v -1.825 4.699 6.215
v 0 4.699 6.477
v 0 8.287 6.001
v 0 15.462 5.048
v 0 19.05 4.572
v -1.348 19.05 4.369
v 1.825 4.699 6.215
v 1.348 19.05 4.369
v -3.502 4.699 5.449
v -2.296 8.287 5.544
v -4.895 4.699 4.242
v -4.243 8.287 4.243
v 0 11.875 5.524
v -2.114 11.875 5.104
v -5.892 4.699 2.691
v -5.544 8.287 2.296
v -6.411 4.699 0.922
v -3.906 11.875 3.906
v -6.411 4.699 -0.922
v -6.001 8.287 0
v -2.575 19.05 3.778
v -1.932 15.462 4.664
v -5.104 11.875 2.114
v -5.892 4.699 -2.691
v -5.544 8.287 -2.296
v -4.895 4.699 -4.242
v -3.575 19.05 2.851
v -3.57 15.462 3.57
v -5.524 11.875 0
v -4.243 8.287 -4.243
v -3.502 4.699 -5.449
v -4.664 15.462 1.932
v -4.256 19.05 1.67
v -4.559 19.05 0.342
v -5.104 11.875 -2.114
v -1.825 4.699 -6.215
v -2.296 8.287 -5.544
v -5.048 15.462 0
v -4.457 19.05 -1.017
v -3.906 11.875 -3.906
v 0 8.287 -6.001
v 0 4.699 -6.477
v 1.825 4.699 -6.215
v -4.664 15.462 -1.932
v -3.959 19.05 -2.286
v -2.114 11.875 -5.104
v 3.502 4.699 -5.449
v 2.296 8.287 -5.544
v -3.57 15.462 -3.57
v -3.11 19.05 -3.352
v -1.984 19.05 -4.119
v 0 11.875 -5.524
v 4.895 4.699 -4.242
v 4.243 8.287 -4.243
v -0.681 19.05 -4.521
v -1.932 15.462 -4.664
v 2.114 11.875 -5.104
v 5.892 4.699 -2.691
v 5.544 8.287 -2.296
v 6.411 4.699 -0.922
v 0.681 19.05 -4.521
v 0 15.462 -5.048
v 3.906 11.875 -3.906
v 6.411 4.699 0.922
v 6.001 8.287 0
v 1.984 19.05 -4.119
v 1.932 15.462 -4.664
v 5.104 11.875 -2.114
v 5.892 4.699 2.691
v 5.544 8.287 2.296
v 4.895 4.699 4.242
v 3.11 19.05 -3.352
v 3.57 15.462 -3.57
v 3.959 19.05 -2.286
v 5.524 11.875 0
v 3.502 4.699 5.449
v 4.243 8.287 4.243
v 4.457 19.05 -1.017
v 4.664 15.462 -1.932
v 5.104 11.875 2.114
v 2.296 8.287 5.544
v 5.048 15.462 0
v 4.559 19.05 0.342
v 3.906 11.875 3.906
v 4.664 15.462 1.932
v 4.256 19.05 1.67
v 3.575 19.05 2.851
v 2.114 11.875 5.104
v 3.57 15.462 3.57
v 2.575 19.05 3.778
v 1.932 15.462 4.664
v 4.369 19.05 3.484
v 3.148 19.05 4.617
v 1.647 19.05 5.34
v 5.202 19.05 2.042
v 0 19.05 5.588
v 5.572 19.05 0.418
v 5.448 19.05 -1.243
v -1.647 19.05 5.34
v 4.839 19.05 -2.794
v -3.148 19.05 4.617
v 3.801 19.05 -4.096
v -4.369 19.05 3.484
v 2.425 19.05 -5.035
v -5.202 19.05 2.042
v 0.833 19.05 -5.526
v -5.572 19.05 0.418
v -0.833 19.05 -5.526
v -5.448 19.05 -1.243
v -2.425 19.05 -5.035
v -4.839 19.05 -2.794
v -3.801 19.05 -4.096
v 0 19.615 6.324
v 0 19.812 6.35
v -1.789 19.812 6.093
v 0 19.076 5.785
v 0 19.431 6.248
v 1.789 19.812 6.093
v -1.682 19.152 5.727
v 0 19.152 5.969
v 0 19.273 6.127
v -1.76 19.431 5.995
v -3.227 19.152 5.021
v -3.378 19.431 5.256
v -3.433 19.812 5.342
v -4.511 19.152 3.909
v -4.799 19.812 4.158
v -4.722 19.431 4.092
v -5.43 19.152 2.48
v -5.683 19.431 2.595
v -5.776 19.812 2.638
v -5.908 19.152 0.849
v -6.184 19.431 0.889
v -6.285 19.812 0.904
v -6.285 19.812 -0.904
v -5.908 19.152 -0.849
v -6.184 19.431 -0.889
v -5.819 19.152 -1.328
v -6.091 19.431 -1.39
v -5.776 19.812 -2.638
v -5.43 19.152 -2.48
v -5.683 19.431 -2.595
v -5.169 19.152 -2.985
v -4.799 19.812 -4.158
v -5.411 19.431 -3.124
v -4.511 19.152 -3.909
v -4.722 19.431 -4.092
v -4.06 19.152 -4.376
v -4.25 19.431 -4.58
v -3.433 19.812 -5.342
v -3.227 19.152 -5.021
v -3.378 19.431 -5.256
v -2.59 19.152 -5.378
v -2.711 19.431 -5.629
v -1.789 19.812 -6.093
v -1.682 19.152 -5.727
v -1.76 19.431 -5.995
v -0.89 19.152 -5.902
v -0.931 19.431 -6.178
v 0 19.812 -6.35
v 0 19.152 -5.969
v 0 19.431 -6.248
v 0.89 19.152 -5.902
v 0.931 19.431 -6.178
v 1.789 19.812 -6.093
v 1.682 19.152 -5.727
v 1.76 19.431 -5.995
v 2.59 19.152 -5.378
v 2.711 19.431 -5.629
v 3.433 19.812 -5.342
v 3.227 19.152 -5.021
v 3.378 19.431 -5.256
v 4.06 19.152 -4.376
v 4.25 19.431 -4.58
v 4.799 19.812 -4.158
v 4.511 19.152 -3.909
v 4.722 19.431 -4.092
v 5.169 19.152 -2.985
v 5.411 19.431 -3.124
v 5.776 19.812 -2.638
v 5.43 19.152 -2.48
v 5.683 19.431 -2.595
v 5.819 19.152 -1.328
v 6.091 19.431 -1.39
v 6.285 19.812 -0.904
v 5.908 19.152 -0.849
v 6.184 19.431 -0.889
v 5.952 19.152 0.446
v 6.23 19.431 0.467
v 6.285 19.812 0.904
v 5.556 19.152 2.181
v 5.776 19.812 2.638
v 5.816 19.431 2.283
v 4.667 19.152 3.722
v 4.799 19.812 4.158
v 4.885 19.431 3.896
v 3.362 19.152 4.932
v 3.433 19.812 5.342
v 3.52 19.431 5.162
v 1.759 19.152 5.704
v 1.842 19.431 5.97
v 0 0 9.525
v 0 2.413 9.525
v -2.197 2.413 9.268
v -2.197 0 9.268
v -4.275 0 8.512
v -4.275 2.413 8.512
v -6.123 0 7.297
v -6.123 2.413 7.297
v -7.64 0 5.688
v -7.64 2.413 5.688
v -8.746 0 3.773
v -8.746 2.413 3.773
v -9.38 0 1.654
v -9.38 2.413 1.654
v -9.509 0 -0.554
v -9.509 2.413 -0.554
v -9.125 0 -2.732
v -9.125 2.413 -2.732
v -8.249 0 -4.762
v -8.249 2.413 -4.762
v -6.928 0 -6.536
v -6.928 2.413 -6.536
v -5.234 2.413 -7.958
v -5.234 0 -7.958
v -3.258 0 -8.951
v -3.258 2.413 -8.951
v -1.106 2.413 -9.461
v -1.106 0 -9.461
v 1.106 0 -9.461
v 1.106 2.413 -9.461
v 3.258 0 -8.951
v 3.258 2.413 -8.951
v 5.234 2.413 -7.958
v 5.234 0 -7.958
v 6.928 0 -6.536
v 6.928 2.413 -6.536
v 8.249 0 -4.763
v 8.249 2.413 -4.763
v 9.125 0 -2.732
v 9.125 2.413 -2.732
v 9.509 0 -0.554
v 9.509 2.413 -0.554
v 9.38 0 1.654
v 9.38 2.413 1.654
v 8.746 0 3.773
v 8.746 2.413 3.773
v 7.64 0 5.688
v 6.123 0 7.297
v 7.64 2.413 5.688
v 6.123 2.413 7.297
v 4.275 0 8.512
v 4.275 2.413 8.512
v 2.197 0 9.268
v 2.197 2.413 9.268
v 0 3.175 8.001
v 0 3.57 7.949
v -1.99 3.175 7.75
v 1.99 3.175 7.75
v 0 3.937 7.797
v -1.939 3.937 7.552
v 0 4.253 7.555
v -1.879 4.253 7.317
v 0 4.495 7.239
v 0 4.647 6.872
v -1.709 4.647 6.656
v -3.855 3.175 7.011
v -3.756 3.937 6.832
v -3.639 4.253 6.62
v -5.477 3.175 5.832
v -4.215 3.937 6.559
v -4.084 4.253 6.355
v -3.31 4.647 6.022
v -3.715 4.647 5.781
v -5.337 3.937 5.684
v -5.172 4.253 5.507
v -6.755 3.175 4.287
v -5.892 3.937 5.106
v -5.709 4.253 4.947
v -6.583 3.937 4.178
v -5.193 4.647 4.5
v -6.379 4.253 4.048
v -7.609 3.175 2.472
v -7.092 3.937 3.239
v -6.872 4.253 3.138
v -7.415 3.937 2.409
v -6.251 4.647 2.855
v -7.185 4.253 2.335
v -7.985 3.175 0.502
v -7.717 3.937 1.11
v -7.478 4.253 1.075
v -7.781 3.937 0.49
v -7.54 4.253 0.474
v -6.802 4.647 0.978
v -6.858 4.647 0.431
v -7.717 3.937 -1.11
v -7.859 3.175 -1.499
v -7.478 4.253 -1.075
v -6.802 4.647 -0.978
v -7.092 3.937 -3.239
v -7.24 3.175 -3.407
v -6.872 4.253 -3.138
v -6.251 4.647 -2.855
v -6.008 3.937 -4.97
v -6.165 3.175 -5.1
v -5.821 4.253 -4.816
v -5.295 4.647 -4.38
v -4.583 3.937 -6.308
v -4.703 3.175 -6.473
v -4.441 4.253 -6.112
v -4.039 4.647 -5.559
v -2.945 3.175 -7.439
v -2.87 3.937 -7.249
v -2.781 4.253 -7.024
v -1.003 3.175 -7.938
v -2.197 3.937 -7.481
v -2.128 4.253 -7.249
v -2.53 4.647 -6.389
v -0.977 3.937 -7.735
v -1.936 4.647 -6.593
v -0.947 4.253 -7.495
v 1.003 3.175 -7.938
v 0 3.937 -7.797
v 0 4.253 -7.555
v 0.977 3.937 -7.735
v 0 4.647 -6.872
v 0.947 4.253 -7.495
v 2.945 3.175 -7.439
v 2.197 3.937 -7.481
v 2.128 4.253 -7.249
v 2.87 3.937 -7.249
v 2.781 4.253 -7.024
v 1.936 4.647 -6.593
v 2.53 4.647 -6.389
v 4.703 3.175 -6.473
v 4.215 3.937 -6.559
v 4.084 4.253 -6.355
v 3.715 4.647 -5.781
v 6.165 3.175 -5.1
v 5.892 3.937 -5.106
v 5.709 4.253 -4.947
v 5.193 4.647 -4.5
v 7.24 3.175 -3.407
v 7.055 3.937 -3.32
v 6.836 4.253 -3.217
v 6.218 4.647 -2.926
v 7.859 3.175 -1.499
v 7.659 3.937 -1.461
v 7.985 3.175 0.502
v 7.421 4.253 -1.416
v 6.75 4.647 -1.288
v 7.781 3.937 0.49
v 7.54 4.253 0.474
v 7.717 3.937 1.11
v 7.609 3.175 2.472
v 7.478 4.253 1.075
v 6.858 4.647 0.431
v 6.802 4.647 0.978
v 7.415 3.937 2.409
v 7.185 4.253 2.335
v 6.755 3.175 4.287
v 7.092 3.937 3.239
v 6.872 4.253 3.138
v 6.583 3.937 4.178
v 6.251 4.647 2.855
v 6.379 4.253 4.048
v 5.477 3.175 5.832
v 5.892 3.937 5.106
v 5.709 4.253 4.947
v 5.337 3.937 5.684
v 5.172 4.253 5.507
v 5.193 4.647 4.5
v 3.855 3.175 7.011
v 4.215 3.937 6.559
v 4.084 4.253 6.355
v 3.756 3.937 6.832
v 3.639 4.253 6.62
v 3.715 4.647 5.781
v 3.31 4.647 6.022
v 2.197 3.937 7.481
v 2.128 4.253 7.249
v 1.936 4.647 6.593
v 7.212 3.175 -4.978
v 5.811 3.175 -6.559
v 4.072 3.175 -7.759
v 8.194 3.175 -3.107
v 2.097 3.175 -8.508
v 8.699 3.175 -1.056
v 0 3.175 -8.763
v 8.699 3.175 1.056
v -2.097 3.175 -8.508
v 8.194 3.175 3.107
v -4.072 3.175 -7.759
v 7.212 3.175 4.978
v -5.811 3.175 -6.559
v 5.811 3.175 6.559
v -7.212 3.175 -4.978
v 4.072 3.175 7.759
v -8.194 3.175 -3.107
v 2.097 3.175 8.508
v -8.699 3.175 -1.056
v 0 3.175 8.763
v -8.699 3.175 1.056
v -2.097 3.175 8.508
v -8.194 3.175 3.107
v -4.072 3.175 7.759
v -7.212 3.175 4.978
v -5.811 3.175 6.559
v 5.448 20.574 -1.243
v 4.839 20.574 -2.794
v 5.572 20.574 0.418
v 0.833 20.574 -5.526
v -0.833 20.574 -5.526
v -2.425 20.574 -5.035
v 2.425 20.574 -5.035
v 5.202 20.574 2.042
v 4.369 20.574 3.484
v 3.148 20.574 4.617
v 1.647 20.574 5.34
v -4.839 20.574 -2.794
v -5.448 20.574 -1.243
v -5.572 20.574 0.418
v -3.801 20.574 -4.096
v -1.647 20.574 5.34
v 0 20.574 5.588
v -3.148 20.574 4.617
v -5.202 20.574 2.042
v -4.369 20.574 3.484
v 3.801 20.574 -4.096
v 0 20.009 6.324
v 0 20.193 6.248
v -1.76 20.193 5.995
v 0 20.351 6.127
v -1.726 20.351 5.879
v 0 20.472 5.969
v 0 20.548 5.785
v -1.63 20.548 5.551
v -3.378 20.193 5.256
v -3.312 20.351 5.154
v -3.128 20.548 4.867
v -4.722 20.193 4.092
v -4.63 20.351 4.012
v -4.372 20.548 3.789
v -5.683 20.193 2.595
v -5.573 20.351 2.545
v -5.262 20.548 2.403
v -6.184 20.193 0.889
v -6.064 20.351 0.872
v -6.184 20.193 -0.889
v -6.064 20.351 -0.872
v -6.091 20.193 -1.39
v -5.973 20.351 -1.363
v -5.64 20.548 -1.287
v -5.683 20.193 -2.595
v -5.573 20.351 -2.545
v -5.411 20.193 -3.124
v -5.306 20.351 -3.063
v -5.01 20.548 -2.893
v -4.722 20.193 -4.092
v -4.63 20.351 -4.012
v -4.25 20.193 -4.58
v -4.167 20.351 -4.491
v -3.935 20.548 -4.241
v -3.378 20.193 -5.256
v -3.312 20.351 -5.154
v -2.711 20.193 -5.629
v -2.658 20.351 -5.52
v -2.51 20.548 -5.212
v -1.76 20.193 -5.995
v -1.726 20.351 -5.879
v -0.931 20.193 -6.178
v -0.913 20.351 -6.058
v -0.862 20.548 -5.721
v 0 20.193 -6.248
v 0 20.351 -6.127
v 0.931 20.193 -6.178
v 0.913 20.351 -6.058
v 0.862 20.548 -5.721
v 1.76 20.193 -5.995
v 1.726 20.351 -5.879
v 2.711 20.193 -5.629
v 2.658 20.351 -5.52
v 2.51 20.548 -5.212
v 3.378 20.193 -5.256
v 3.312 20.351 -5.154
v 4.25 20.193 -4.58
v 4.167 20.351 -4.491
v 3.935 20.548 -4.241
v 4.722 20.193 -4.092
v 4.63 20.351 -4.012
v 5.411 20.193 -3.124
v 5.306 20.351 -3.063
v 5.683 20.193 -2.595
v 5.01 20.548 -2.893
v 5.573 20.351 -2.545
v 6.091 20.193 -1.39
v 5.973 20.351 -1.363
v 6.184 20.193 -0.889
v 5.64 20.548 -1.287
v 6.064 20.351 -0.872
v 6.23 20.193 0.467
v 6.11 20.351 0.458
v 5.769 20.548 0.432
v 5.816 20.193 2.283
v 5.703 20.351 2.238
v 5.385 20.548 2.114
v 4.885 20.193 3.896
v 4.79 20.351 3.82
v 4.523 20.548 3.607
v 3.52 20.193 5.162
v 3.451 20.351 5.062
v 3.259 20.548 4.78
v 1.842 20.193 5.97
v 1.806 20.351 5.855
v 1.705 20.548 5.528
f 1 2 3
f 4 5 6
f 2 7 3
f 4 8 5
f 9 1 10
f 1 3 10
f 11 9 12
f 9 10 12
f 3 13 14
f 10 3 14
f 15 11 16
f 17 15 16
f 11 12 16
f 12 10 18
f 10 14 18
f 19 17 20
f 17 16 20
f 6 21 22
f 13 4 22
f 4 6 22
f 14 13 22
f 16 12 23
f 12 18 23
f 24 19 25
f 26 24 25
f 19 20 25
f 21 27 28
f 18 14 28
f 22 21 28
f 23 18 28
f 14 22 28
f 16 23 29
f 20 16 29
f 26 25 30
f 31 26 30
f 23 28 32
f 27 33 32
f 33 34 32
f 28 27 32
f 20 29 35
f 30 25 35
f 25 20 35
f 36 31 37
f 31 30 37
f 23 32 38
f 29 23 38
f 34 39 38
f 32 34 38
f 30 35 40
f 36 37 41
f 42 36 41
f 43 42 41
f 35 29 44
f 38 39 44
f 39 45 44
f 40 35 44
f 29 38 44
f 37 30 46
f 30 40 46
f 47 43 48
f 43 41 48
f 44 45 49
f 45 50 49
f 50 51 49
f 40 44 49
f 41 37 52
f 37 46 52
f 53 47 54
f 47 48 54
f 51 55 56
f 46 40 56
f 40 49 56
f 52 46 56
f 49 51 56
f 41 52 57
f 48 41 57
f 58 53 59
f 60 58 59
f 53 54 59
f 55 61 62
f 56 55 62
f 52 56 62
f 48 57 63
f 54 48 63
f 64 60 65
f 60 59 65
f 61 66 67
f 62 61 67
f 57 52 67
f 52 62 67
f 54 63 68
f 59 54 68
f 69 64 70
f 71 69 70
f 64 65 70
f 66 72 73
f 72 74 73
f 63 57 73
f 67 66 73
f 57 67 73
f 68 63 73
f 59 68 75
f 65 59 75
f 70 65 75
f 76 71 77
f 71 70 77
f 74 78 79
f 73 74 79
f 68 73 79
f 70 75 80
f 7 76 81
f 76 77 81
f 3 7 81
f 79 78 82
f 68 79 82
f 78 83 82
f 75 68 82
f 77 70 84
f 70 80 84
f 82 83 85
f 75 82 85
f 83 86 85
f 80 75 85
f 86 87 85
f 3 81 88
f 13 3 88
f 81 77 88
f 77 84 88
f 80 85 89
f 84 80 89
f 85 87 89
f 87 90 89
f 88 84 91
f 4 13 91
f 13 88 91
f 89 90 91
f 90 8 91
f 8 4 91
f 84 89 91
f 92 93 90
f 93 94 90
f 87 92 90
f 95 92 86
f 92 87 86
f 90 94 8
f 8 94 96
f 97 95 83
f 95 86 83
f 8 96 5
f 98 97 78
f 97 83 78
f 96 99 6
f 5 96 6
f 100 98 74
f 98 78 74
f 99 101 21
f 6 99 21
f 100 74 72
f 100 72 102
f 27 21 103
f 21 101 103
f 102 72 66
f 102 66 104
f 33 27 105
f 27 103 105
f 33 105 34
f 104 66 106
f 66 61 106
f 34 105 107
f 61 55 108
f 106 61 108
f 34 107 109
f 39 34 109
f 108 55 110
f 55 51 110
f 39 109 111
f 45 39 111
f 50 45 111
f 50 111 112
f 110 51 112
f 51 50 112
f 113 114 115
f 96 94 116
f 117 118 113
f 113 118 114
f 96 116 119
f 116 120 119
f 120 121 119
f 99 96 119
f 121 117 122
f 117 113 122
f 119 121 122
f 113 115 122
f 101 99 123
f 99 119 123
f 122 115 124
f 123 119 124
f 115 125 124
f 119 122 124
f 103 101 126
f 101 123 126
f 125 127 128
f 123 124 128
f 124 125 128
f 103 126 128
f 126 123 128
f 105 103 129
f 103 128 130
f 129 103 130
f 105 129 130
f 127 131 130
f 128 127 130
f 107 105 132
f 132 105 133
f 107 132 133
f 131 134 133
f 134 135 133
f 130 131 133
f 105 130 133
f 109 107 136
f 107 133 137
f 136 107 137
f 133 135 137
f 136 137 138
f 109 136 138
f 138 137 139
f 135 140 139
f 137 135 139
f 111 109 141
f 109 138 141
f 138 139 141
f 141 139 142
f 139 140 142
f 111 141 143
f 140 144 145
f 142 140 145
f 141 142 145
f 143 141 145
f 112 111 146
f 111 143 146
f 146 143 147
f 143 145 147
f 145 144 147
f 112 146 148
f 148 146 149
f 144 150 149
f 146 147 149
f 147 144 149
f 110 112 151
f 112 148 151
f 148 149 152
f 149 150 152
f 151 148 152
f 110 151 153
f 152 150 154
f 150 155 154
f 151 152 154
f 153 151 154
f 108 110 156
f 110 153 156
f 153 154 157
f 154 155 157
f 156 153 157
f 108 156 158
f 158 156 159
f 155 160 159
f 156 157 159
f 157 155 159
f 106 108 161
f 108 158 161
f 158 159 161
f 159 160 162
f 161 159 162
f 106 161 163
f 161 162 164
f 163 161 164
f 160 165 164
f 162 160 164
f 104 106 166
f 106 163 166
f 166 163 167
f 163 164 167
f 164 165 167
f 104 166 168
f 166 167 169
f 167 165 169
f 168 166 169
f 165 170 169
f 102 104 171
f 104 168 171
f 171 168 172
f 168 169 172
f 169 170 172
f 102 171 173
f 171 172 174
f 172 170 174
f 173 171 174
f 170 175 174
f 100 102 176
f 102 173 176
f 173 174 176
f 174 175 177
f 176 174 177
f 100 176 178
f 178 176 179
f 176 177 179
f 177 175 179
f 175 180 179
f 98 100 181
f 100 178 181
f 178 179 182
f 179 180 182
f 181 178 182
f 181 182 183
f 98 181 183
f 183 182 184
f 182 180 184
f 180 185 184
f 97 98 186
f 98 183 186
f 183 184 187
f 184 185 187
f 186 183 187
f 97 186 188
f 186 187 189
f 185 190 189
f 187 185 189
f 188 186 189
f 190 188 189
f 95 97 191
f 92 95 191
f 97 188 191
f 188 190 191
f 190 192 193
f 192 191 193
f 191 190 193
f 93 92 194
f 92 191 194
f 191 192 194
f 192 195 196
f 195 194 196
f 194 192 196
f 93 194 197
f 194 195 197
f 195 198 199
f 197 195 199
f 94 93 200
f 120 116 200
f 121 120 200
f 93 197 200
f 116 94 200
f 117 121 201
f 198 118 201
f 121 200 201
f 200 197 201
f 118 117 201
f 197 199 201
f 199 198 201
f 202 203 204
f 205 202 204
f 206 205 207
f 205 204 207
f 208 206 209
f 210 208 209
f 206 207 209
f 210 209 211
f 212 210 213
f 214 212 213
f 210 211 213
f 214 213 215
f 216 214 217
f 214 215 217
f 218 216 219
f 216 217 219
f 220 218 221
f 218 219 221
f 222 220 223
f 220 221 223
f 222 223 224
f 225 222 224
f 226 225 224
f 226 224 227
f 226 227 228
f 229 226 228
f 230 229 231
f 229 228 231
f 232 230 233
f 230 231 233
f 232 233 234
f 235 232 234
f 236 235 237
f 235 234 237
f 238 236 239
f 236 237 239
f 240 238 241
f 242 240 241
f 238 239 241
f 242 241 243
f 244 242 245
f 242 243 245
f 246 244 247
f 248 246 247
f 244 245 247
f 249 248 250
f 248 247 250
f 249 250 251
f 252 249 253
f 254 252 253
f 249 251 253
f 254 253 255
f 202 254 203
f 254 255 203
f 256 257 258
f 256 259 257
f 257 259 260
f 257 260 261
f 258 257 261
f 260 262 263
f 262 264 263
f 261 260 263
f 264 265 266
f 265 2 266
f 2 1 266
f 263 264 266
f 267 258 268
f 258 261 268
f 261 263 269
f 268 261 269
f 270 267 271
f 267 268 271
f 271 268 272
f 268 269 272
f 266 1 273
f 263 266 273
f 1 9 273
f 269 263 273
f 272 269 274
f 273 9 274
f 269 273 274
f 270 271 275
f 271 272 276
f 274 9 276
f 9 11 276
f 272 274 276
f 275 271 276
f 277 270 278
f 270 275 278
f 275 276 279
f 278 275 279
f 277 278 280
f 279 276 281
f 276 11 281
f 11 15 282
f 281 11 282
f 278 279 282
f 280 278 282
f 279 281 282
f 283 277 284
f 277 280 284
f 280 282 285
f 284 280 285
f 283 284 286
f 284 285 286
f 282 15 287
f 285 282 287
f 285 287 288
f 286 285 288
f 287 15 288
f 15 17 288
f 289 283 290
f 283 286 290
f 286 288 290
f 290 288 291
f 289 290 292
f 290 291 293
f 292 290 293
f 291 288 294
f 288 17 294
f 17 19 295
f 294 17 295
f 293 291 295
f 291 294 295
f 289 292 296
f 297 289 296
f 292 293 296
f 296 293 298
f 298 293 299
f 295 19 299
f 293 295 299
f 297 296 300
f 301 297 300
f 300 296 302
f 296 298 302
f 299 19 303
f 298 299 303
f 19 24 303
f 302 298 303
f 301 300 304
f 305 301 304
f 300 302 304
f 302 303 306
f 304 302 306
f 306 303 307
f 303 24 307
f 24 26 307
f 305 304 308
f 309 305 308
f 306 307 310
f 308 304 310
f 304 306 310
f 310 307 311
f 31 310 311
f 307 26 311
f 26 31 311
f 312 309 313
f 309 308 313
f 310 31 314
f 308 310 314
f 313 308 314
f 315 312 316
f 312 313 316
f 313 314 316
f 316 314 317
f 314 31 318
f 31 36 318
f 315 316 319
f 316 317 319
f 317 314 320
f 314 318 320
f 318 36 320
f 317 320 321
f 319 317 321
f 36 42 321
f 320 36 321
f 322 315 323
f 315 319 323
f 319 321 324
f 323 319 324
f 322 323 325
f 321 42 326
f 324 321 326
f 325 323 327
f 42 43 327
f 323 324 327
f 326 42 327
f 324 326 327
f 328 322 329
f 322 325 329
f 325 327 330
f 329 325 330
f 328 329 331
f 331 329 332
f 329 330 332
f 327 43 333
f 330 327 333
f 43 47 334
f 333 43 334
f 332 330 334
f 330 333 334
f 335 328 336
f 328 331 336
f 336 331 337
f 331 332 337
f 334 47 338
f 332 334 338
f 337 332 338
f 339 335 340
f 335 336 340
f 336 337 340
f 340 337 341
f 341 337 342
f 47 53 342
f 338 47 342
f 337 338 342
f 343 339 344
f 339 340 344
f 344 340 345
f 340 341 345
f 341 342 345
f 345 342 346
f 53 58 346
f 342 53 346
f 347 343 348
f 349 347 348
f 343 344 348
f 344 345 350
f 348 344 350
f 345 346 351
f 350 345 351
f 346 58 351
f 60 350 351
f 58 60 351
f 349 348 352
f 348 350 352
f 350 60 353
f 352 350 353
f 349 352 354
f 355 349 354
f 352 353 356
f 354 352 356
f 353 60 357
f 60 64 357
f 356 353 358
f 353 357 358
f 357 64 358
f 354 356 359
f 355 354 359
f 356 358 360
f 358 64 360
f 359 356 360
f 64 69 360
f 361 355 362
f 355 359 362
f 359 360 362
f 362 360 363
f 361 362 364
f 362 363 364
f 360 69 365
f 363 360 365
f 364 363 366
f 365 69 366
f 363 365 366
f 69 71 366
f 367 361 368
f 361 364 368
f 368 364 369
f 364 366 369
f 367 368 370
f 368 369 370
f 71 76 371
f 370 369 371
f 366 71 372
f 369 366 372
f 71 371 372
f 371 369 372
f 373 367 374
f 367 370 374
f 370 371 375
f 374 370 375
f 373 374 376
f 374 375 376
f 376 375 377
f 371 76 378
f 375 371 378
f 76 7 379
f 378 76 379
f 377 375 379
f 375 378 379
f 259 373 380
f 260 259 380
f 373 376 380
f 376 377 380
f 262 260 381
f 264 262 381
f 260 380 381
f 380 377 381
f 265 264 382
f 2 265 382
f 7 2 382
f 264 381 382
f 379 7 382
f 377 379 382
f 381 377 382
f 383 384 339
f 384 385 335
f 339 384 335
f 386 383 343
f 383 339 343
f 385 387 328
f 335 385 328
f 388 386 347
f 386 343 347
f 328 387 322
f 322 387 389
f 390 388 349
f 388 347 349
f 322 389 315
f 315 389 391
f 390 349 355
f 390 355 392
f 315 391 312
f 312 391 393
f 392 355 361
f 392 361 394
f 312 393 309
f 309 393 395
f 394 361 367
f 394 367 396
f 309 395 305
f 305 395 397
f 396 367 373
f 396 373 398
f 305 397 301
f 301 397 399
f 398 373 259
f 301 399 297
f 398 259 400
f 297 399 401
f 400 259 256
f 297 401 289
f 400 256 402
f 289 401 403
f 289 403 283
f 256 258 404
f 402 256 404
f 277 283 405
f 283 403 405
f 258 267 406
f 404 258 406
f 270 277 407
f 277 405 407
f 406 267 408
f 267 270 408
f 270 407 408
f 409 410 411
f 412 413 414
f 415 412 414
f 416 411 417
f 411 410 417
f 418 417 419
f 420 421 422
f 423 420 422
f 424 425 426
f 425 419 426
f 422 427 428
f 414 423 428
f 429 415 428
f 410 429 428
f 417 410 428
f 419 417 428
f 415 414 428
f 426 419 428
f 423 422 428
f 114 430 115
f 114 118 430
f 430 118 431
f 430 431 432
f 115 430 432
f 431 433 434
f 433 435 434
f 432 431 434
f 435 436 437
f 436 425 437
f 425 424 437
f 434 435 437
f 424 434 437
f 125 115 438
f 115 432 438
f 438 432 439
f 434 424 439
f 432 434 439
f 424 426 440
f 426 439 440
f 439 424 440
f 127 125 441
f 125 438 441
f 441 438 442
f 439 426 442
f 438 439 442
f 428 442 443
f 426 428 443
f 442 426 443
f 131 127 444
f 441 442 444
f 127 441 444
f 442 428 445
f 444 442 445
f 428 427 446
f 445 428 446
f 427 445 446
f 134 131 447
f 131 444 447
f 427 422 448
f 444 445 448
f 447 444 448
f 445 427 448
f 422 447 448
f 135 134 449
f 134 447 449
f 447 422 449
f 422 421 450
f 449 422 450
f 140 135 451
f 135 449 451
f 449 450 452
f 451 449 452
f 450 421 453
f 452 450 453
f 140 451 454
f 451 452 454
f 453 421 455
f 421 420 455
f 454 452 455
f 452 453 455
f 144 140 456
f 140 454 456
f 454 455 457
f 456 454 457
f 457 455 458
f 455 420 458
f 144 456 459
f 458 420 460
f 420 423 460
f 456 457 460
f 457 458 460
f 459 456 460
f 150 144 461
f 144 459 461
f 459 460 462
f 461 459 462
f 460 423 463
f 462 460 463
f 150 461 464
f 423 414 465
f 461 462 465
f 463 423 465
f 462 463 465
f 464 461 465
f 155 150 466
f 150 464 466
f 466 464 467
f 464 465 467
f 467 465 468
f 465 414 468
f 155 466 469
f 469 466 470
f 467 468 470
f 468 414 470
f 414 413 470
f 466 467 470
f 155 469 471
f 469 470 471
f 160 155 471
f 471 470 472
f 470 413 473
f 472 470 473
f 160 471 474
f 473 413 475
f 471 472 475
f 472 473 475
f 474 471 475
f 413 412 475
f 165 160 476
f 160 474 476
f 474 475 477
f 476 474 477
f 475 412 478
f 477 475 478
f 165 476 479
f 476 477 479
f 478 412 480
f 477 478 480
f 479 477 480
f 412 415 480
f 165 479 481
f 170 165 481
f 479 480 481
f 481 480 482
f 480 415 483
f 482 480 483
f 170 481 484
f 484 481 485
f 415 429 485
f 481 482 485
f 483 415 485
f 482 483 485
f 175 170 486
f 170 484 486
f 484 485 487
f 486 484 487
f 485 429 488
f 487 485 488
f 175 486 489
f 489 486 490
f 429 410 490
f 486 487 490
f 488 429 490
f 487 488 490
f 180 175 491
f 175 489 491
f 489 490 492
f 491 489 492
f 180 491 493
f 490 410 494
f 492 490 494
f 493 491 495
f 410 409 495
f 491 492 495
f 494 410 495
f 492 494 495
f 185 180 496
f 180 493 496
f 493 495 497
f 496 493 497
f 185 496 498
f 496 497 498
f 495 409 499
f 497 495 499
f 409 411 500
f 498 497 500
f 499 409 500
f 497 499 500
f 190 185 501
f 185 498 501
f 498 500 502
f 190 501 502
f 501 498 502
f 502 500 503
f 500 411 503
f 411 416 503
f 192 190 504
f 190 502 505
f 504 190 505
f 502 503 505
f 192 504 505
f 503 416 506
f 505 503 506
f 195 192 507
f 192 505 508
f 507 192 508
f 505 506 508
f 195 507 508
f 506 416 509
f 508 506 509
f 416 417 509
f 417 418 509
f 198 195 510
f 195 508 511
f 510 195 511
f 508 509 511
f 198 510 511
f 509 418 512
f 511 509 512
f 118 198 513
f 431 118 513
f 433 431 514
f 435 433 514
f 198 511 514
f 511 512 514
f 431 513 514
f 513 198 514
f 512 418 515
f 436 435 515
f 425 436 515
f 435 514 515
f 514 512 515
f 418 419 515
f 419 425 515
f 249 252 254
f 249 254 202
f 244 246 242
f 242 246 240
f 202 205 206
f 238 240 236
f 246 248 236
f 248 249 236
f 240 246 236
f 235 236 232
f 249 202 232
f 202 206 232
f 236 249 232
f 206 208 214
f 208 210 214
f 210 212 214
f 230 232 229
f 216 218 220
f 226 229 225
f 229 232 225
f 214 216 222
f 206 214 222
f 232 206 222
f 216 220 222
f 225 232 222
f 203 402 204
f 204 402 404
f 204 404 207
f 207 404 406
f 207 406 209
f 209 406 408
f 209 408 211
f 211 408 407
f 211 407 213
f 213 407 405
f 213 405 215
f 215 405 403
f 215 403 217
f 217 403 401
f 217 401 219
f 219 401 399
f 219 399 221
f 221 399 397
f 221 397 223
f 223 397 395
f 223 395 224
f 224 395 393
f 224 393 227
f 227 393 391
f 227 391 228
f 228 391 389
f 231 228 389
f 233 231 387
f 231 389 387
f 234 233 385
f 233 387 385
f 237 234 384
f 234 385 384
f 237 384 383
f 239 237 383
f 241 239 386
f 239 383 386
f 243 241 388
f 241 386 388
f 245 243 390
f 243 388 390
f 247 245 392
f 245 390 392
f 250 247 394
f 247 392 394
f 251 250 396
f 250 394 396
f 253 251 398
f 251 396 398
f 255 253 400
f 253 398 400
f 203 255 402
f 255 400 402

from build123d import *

# Parameters (mm, degrees)
CHAMFER1_SIZE = 0.762
FILLET2_R     = 1.524
FILLET3_R     = 0.762


with BuildPart() as part:
    # Sketch3 → Revolve1 (revolve)
    with BuildSketch(Plane.XY, mode=Mode.PRIVATE) as revolve1_sk:
        Polygon((0, 0), (-9.525, 0), (-9.525, 3.175), (-8.001, 3.175), (-8.001, 4.699), (-6.477, 4.699), (-4.572, 19.05), (-6.35, 19.05), (-6.35, 20.574), (0, 20.574), align=None)
    revolve(revolve1_sk.sketch.rotate(Axis((0, 20.574, 0), (0, -1, 0)), 270), axis=Axis((0, 20.574, 0), (0, -1, 0)))

    # Chamfer1
    chamfer1_edges = [part.edges().sort_by_distance(p)[0] for p in [
        (0, 3.175, -9.525),
    ]]
    chamfer(chamfer1_edges, length=CHAMFER1_SIZE)

    # Fillet2
    fillet2_edges = [part.edges().sort_by_distance(p)[0] for p in [
        (0, 4.699, -8.001),
    ]]
    fillet(fillet2_edges, radius=FILLET2_R - 0.0001)  # a hair under: the kernel refuses the full size

    # Fillet3
    fillet3_edges = [part.edges().sort_by_distance(p)[0] for p in [
        (0, 20.574, -6.35),
        (0, 19.05, -6.35),
    ]]
    fillet(fillet3_edges, radius=FILLET3_R - 0.0001)  # a hair under: the kernel refuses the full size


solid = part.part
